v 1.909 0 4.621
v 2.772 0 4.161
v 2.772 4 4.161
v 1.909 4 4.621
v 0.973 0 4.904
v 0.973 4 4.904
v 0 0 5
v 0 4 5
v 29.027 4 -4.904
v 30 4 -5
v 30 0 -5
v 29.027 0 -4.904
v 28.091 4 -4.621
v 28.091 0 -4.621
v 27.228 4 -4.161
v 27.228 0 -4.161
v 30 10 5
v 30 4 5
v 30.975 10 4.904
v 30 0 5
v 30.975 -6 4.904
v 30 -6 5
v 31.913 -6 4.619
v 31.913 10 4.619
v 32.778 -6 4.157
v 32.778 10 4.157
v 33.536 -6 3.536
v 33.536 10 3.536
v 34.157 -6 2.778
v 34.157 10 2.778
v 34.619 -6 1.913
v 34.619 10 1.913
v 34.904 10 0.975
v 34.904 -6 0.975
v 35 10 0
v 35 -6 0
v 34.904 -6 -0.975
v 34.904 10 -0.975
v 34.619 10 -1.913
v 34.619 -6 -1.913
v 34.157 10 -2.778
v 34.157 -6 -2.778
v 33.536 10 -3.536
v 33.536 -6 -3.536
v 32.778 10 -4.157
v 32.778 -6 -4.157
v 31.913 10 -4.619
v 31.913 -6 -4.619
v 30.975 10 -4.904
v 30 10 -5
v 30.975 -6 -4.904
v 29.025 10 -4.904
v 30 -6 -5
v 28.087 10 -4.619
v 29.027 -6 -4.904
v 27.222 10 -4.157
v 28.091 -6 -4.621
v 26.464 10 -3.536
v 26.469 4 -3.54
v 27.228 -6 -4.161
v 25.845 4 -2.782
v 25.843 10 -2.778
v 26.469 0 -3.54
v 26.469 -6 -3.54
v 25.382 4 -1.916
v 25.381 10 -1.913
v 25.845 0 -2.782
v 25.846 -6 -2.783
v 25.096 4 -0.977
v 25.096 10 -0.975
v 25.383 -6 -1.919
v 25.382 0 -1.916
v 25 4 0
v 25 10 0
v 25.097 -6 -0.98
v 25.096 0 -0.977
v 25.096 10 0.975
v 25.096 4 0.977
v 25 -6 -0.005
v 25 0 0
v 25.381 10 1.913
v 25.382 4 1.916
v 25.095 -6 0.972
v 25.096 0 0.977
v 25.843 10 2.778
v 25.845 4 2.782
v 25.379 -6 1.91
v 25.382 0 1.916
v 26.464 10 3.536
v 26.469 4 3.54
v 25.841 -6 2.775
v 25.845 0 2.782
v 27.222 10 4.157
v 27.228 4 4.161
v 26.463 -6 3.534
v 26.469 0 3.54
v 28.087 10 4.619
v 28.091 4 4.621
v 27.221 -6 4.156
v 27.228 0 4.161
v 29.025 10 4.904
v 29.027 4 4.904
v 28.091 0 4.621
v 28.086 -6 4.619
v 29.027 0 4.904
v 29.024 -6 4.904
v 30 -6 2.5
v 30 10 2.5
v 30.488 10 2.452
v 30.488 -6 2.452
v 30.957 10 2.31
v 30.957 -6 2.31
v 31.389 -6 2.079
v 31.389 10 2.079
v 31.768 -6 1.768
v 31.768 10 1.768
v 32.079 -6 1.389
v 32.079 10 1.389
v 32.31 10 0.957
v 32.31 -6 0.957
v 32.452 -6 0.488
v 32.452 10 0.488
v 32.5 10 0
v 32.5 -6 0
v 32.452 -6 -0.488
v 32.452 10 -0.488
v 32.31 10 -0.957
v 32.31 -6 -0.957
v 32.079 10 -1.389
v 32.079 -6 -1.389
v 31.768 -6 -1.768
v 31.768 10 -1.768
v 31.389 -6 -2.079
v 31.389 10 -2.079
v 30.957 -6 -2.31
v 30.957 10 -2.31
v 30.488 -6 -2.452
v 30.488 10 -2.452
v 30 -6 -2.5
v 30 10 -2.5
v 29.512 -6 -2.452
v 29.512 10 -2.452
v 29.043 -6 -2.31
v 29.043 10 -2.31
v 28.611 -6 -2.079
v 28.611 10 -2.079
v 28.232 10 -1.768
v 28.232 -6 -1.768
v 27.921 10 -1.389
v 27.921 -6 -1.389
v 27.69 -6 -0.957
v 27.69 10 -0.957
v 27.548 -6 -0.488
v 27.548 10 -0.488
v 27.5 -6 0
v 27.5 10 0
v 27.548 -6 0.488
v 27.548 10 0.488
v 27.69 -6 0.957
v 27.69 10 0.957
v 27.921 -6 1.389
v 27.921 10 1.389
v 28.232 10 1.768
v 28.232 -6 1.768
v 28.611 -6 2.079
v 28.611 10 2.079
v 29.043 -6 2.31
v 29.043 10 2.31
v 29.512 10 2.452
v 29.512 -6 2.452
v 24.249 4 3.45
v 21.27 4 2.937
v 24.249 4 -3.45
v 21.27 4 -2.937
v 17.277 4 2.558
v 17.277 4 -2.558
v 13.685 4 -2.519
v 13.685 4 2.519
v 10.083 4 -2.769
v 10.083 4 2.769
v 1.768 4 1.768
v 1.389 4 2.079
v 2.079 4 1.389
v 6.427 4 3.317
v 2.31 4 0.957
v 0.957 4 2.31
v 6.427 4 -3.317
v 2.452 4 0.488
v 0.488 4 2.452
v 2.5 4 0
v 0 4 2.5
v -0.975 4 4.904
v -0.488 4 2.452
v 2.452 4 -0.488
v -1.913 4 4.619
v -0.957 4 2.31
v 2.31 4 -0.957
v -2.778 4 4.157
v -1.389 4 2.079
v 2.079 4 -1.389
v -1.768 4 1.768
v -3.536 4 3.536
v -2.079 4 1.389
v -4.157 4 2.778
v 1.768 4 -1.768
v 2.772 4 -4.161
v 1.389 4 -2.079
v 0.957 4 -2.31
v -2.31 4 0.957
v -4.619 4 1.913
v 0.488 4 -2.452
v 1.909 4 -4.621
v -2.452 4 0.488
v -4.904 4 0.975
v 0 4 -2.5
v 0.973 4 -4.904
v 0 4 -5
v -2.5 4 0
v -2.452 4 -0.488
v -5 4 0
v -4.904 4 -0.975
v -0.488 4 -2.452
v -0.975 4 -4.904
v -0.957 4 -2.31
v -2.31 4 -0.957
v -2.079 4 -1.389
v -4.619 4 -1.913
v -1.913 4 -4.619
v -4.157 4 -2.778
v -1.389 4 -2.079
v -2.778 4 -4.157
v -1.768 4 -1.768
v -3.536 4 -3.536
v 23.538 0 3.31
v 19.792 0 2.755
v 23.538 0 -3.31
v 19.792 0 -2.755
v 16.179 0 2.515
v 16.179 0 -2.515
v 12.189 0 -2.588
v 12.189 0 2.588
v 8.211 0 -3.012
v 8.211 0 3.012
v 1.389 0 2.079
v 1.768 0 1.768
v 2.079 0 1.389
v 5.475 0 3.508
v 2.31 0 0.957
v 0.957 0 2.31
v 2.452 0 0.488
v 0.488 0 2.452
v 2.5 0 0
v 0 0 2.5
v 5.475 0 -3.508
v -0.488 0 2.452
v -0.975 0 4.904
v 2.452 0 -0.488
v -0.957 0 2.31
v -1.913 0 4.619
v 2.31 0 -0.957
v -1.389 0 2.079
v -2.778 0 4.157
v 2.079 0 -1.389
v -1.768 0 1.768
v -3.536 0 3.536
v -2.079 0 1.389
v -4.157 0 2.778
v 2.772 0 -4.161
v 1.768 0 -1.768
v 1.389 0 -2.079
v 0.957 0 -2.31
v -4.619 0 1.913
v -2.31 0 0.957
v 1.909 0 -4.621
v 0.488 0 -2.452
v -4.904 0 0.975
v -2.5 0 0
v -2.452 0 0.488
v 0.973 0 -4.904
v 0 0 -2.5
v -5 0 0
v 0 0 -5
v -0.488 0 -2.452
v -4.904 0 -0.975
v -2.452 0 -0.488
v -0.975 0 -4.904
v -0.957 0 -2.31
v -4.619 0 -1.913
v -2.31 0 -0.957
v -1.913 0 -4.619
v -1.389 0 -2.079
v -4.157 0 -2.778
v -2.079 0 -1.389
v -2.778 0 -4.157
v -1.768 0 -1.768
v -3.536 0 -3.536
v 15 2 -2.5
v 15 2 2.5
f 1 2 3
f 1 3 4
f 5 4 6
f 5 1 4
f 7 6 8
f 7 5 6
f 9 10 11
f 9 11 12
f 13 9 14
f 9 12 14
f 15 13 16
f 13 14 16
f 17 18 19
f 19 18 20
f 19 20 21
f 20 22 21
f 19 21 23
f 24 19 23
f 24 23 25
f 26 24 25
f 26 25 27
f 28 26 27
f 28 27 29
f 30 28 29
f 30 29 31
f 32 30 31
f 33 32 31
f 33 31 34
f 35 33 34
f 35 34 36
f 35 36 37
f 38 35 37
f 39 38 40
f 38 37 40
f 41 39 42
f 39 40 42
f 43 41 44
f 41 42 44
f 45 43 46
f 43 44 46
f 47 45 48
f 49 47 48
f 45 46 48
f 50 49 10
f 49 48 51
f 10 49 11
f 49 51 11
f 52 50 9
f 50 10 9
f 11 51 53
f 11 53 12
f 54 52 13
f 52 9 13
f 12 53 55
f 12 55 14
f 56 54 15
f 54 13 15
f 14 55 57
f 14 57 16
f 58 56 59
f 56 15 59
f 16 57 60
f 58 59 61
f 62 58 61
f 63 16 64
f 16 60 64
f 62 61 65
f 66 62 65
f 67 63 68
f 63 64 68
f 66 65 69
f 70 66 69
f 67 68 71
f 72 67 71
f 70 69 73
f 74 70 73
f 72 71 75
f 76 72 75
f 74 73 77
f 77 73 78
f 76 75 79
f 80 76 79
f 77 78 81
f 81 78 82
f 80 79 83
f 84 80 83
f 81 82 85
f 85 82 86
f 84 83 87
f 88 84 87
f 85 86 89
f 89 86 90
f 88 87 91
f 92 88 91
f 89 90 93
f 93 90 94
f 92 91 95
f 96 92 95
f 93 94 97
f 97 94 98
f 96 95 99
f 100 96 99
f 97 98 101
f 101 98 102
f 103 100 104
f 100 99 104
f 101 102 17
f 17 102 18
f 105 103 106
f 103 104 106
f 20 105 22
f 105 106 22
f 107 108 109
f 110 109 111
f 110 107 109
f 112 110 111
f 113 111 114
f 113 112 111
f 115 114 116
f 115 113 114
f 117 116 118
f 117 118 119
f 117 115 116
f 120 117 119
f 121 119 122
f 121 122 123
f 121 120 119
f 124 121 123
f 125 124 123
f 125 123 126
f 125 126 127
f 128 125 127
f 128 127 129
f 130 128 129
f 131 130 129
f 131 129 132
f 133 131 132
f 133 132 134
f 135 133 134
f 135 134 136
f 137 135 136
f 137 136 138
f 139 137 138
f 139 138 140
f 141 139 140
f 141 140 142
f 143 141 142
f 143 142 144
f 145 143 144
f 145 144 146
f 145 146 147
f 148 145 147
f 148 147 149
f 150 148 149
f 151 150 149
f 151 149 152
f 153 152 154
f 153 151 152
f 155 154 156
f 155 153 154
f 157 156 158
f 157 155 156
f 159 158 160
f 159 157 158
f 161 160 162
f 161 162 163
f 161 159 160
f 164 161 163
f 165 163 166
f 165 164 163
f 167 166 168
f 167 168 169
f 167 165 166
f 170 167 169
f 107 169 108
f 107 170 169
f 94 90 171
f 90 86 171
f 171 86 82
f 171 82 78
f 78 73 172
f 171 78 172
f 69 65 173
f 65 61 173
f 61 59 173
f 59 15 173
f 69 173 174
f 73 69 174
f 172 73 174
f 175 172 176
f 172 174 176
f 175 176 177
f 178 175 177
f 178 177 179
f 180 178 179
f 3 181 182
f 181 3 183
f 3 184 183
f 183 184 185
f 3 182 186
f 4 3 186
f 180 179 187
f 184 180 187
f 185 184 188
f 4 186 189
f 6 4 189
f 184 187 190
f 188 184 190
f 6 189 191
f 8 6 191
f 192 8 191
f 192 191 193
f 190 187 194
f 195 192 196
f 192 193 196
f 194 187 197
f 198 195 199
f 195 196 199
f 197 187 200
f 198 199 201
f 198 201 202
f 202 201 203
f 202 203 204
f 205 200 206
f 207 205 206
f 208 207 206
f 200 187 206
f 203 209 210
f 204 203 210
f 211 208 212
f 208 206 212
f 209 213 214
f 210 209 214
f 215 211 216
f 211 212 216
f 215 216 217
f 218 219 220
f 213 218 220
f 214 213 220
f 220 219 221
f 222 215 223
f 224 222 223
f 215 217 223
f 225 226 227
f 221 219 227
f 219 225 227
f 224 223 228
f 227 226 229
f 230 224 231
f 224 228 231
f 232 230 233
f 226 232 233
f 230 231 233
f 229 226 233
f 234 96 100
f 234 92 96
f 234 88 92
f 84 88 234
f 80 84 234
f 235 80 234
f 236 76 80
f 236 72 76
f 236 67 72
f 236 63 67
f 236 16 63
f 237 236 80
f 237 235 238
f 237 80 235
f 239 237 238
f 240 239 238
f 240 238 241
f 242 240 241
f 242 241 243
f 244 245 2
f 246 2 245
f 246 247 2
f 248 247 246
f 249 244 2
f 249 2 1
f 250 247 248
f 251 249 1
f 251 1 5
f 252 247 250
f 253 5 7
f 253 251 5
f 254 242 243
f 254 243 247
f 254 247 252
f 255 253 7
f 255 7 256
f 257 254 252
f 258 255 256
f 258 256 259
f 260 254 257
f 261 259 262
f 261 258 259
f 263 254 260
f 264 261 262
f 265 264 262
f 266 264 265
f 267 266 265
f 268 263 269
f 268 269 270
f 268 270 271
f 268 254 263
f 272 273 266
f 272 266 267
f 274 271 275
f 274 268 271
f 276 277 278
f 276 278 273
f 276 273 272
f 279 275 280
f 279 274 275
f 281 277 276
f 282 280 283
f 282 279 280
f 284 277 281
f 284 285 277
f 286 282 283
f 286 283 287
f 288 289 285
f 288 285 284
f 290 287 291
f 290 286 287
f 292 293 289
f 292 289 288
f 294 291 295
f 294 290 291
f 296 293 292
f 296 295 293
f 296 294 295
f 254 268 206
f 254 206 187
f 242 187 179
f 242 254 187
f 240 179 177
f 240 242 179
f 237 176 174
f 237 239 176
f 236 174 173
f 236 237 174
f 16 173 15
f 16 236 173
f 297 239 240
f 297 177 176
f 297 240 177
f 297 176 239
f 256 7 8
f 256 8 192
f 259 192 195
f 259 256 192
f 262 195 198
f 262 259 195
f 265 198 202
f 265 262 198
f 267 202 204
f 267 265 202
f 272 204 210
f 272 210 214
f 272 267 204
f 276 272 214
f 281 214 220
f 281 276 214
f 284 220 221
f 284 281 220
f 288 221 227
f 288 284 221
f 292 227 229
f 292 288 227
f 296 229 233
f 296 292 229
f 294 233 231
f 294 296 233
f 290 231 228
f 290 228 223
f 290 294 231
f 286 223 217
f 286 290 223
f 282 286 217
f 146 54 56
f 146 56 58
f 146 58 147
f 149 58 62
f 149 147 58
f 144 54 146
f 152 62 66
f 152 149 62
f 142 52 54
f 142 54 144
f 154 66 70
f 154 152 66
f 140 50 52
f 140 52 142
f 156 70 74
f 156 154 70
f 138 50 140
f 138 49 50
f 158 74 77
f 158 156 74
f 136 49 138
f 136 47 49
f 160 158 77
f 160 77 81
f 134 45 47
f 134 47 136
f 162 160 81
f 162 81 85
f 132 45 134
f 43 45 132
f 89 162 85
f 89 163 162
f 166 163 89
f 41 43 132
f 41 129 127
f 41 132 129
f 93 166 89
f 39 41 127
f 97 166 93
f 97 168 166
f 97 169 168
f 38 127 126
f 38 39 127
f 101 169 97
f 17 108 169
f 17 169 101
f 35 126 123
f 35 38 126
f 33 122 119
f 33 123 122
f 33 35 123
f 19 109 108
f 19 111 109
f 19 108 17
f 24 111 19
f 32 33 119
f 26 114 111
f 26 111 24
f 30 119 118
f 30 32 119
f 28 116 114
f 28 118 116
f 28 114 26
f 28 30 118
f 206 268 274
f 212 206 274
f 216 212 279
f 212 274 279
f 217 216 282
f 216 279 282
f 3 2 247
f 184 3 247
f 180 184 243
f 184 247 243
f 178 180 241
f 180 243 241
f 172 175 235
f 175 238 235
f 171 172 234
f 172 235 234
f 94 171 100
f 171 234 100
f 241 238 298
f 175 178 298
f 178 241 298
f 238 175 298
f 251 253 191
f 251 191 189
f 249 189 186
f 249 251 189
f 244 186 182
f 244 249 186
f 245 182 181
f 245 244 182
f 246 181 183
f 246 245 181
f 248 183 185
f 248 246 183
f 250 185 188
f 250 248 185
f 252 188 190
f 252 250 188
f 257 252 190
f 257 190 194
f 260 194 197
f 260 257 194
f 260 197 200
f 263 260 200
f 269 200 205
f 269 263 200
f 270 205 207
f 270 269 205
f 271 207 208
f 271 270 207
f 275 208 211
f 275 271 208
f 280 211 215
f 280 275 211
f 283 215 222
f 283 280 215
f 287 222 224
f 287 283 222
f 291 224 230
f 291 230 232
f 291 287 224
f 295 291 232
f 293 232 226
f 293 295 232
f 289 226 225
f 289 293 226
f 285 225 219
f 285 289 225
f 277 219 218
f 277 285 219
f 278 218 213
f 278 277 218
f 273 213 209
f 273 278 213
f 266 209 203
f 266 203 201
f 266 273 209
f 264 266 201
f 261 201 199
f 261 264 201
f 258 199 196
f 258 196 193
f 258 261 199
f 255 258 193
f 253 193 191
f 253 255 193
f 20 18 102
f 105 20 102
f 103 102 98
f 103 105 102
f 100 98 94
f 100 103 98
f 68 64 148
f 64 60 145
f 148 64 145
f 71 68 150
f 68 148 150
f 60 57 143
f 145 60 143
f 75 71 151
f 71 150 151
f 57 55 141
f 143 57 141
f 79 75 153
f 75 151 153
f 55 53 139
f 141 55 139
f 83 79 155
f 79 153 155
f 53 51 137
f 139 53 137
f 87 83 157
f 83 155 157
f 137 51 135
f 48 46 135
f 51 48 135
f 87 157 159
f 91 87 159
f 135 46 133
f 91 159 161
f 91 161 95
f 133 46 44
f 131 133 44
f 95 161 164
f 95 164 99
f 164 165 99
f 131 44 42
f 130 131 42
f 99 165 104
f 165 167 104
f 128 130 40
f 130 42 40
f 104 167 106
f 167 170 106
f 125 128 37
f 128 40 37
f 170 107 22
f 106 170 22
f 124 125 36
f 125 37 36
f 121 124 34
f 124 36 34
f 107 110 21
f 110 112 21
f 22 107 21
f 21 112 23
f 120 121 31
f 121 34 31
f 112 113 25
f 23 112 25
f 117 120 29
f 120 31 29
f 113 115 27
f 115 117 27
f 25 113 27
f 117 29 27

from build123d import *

# Parameters (mm, degrees)
SKETCH1_R                = 2.5
BOSS_EXTRUDE1_DEPTH      = 4
BOSS_EXTRUDE3_DEPTH      = 8
BOSS_EXTRUDE3_DEPTH_BACK = 8
SKETCH3_R                = 5
SKETCH3_R_2              = 2.5
CUT_EXTRUDE1_START       = -10
CUT_EXTRUDE1_DEPTH       = 10


with BuildPart() as part:
    # Sketch1 → Boss-Extrude1 (new body)
    with BuildSketch(Plane(origin=(0, 0, 0), x_dir=(1, 0, 0), z_dir=(0, 1, 0))):
        with BuildLine():
            Line((0, 5), (30, 5))
            ThreePointArc((30, 5), (35, 0), (30, -5))
            Line((30, -5), (0, -5))
            ThreePointArc((0, -5), (-5, 0), (0, 5))
        make_face()
        with Locations(Location((0, 0, 0), (0, 0, 270))):
            Circle(SKETCH1_R, mode=Mode.SUBTRACT)
        with Locations(Location((30, 0, 0), (0, 0, 270))):
            Circle(SKETCH1_R, mode=Mode.SUBTRACT)
    extrude(amount=BOSS_EXTRUDE1_DEPTH)

    # Sketch3 → Boss-Extrude3 (add, two sides: drawn at the far end of the back side and taken through both)
    with BuildSketch(Plane(origin=(0, 2, 0), x_dir=(1, 0, 0), z_dir=(0, 1, 0)).offset(-BOSS_EXTRUDE3_DEPTH_BACK)):
        with Locations(Location((30, 0, 0), (0, 0, 270))):
            Circle(SKETCH3_R)
        with Locations(Location((30, 0, 0), (0, 0, 270))):
            Circle(SKETCH3_R_2, mode=Mode.SUBTRACT)
    extrude(amount=BOSS_EXTRUDE3_DEPTH + BOSS_EXTRUDE3_DEPTH_BACK)

    # Sketch4 → Cut-Extrude1 (cut)
    with BuildSketch(Plane(origin=(0, 4, 0), x_dir=(1, 0, 0), z_dir=(0, 1, 0)).offset(CUT_EXTRUDE1_START)):
        with BuildLine():
            Line((0, -5), (30, -5))
            ThreePointArc((30, -5), (28.552126, -4.785777), (27.228319, -4.161464))
            add(Edge.make_bspline(
                [(2.771681, -4.161464), (6.847787, -3.053821), (15, -1.946179), (23.152213, -3.053821), (27.228319, -4.161464)],
                knots=[0.092389, 0.092389, 0.092389, 0.092389, 0.5, 0.907611, 0.907611, 0.907611, 0.907611], degree=3))
            ThreePointArc((2.771681, -4.161464), (1.447874, -4.785777), (0, -5))
        make_face()
        with BuildLine():
            Line((0, 5), (30, 5))
            ThreePointArc((30, 5), (28.552126, 4.785777), (27.228319, 4.161464))
            add(Edge.make_bspline(
                [(2.771681, 4.161464), (6.847787, 3.053821), (15, 1.946179), (23.152213, 3.053821), (27.228319, 4.161464)],
                knots=[0.092389, 0.092389, 0.092389, 0.092389, 0.5, 0.907611, 0.907611, 0.907611, 0.907611], degree=3))
            ThreePointArc((2.771681, 4.161464), (1.447874, 4.785777), (0, 5))
        make_face()
    extrude(amount=CUT_EXTRUDE1_DEPTH, mode=Mode.SUBTRACT)


solid = part.part
